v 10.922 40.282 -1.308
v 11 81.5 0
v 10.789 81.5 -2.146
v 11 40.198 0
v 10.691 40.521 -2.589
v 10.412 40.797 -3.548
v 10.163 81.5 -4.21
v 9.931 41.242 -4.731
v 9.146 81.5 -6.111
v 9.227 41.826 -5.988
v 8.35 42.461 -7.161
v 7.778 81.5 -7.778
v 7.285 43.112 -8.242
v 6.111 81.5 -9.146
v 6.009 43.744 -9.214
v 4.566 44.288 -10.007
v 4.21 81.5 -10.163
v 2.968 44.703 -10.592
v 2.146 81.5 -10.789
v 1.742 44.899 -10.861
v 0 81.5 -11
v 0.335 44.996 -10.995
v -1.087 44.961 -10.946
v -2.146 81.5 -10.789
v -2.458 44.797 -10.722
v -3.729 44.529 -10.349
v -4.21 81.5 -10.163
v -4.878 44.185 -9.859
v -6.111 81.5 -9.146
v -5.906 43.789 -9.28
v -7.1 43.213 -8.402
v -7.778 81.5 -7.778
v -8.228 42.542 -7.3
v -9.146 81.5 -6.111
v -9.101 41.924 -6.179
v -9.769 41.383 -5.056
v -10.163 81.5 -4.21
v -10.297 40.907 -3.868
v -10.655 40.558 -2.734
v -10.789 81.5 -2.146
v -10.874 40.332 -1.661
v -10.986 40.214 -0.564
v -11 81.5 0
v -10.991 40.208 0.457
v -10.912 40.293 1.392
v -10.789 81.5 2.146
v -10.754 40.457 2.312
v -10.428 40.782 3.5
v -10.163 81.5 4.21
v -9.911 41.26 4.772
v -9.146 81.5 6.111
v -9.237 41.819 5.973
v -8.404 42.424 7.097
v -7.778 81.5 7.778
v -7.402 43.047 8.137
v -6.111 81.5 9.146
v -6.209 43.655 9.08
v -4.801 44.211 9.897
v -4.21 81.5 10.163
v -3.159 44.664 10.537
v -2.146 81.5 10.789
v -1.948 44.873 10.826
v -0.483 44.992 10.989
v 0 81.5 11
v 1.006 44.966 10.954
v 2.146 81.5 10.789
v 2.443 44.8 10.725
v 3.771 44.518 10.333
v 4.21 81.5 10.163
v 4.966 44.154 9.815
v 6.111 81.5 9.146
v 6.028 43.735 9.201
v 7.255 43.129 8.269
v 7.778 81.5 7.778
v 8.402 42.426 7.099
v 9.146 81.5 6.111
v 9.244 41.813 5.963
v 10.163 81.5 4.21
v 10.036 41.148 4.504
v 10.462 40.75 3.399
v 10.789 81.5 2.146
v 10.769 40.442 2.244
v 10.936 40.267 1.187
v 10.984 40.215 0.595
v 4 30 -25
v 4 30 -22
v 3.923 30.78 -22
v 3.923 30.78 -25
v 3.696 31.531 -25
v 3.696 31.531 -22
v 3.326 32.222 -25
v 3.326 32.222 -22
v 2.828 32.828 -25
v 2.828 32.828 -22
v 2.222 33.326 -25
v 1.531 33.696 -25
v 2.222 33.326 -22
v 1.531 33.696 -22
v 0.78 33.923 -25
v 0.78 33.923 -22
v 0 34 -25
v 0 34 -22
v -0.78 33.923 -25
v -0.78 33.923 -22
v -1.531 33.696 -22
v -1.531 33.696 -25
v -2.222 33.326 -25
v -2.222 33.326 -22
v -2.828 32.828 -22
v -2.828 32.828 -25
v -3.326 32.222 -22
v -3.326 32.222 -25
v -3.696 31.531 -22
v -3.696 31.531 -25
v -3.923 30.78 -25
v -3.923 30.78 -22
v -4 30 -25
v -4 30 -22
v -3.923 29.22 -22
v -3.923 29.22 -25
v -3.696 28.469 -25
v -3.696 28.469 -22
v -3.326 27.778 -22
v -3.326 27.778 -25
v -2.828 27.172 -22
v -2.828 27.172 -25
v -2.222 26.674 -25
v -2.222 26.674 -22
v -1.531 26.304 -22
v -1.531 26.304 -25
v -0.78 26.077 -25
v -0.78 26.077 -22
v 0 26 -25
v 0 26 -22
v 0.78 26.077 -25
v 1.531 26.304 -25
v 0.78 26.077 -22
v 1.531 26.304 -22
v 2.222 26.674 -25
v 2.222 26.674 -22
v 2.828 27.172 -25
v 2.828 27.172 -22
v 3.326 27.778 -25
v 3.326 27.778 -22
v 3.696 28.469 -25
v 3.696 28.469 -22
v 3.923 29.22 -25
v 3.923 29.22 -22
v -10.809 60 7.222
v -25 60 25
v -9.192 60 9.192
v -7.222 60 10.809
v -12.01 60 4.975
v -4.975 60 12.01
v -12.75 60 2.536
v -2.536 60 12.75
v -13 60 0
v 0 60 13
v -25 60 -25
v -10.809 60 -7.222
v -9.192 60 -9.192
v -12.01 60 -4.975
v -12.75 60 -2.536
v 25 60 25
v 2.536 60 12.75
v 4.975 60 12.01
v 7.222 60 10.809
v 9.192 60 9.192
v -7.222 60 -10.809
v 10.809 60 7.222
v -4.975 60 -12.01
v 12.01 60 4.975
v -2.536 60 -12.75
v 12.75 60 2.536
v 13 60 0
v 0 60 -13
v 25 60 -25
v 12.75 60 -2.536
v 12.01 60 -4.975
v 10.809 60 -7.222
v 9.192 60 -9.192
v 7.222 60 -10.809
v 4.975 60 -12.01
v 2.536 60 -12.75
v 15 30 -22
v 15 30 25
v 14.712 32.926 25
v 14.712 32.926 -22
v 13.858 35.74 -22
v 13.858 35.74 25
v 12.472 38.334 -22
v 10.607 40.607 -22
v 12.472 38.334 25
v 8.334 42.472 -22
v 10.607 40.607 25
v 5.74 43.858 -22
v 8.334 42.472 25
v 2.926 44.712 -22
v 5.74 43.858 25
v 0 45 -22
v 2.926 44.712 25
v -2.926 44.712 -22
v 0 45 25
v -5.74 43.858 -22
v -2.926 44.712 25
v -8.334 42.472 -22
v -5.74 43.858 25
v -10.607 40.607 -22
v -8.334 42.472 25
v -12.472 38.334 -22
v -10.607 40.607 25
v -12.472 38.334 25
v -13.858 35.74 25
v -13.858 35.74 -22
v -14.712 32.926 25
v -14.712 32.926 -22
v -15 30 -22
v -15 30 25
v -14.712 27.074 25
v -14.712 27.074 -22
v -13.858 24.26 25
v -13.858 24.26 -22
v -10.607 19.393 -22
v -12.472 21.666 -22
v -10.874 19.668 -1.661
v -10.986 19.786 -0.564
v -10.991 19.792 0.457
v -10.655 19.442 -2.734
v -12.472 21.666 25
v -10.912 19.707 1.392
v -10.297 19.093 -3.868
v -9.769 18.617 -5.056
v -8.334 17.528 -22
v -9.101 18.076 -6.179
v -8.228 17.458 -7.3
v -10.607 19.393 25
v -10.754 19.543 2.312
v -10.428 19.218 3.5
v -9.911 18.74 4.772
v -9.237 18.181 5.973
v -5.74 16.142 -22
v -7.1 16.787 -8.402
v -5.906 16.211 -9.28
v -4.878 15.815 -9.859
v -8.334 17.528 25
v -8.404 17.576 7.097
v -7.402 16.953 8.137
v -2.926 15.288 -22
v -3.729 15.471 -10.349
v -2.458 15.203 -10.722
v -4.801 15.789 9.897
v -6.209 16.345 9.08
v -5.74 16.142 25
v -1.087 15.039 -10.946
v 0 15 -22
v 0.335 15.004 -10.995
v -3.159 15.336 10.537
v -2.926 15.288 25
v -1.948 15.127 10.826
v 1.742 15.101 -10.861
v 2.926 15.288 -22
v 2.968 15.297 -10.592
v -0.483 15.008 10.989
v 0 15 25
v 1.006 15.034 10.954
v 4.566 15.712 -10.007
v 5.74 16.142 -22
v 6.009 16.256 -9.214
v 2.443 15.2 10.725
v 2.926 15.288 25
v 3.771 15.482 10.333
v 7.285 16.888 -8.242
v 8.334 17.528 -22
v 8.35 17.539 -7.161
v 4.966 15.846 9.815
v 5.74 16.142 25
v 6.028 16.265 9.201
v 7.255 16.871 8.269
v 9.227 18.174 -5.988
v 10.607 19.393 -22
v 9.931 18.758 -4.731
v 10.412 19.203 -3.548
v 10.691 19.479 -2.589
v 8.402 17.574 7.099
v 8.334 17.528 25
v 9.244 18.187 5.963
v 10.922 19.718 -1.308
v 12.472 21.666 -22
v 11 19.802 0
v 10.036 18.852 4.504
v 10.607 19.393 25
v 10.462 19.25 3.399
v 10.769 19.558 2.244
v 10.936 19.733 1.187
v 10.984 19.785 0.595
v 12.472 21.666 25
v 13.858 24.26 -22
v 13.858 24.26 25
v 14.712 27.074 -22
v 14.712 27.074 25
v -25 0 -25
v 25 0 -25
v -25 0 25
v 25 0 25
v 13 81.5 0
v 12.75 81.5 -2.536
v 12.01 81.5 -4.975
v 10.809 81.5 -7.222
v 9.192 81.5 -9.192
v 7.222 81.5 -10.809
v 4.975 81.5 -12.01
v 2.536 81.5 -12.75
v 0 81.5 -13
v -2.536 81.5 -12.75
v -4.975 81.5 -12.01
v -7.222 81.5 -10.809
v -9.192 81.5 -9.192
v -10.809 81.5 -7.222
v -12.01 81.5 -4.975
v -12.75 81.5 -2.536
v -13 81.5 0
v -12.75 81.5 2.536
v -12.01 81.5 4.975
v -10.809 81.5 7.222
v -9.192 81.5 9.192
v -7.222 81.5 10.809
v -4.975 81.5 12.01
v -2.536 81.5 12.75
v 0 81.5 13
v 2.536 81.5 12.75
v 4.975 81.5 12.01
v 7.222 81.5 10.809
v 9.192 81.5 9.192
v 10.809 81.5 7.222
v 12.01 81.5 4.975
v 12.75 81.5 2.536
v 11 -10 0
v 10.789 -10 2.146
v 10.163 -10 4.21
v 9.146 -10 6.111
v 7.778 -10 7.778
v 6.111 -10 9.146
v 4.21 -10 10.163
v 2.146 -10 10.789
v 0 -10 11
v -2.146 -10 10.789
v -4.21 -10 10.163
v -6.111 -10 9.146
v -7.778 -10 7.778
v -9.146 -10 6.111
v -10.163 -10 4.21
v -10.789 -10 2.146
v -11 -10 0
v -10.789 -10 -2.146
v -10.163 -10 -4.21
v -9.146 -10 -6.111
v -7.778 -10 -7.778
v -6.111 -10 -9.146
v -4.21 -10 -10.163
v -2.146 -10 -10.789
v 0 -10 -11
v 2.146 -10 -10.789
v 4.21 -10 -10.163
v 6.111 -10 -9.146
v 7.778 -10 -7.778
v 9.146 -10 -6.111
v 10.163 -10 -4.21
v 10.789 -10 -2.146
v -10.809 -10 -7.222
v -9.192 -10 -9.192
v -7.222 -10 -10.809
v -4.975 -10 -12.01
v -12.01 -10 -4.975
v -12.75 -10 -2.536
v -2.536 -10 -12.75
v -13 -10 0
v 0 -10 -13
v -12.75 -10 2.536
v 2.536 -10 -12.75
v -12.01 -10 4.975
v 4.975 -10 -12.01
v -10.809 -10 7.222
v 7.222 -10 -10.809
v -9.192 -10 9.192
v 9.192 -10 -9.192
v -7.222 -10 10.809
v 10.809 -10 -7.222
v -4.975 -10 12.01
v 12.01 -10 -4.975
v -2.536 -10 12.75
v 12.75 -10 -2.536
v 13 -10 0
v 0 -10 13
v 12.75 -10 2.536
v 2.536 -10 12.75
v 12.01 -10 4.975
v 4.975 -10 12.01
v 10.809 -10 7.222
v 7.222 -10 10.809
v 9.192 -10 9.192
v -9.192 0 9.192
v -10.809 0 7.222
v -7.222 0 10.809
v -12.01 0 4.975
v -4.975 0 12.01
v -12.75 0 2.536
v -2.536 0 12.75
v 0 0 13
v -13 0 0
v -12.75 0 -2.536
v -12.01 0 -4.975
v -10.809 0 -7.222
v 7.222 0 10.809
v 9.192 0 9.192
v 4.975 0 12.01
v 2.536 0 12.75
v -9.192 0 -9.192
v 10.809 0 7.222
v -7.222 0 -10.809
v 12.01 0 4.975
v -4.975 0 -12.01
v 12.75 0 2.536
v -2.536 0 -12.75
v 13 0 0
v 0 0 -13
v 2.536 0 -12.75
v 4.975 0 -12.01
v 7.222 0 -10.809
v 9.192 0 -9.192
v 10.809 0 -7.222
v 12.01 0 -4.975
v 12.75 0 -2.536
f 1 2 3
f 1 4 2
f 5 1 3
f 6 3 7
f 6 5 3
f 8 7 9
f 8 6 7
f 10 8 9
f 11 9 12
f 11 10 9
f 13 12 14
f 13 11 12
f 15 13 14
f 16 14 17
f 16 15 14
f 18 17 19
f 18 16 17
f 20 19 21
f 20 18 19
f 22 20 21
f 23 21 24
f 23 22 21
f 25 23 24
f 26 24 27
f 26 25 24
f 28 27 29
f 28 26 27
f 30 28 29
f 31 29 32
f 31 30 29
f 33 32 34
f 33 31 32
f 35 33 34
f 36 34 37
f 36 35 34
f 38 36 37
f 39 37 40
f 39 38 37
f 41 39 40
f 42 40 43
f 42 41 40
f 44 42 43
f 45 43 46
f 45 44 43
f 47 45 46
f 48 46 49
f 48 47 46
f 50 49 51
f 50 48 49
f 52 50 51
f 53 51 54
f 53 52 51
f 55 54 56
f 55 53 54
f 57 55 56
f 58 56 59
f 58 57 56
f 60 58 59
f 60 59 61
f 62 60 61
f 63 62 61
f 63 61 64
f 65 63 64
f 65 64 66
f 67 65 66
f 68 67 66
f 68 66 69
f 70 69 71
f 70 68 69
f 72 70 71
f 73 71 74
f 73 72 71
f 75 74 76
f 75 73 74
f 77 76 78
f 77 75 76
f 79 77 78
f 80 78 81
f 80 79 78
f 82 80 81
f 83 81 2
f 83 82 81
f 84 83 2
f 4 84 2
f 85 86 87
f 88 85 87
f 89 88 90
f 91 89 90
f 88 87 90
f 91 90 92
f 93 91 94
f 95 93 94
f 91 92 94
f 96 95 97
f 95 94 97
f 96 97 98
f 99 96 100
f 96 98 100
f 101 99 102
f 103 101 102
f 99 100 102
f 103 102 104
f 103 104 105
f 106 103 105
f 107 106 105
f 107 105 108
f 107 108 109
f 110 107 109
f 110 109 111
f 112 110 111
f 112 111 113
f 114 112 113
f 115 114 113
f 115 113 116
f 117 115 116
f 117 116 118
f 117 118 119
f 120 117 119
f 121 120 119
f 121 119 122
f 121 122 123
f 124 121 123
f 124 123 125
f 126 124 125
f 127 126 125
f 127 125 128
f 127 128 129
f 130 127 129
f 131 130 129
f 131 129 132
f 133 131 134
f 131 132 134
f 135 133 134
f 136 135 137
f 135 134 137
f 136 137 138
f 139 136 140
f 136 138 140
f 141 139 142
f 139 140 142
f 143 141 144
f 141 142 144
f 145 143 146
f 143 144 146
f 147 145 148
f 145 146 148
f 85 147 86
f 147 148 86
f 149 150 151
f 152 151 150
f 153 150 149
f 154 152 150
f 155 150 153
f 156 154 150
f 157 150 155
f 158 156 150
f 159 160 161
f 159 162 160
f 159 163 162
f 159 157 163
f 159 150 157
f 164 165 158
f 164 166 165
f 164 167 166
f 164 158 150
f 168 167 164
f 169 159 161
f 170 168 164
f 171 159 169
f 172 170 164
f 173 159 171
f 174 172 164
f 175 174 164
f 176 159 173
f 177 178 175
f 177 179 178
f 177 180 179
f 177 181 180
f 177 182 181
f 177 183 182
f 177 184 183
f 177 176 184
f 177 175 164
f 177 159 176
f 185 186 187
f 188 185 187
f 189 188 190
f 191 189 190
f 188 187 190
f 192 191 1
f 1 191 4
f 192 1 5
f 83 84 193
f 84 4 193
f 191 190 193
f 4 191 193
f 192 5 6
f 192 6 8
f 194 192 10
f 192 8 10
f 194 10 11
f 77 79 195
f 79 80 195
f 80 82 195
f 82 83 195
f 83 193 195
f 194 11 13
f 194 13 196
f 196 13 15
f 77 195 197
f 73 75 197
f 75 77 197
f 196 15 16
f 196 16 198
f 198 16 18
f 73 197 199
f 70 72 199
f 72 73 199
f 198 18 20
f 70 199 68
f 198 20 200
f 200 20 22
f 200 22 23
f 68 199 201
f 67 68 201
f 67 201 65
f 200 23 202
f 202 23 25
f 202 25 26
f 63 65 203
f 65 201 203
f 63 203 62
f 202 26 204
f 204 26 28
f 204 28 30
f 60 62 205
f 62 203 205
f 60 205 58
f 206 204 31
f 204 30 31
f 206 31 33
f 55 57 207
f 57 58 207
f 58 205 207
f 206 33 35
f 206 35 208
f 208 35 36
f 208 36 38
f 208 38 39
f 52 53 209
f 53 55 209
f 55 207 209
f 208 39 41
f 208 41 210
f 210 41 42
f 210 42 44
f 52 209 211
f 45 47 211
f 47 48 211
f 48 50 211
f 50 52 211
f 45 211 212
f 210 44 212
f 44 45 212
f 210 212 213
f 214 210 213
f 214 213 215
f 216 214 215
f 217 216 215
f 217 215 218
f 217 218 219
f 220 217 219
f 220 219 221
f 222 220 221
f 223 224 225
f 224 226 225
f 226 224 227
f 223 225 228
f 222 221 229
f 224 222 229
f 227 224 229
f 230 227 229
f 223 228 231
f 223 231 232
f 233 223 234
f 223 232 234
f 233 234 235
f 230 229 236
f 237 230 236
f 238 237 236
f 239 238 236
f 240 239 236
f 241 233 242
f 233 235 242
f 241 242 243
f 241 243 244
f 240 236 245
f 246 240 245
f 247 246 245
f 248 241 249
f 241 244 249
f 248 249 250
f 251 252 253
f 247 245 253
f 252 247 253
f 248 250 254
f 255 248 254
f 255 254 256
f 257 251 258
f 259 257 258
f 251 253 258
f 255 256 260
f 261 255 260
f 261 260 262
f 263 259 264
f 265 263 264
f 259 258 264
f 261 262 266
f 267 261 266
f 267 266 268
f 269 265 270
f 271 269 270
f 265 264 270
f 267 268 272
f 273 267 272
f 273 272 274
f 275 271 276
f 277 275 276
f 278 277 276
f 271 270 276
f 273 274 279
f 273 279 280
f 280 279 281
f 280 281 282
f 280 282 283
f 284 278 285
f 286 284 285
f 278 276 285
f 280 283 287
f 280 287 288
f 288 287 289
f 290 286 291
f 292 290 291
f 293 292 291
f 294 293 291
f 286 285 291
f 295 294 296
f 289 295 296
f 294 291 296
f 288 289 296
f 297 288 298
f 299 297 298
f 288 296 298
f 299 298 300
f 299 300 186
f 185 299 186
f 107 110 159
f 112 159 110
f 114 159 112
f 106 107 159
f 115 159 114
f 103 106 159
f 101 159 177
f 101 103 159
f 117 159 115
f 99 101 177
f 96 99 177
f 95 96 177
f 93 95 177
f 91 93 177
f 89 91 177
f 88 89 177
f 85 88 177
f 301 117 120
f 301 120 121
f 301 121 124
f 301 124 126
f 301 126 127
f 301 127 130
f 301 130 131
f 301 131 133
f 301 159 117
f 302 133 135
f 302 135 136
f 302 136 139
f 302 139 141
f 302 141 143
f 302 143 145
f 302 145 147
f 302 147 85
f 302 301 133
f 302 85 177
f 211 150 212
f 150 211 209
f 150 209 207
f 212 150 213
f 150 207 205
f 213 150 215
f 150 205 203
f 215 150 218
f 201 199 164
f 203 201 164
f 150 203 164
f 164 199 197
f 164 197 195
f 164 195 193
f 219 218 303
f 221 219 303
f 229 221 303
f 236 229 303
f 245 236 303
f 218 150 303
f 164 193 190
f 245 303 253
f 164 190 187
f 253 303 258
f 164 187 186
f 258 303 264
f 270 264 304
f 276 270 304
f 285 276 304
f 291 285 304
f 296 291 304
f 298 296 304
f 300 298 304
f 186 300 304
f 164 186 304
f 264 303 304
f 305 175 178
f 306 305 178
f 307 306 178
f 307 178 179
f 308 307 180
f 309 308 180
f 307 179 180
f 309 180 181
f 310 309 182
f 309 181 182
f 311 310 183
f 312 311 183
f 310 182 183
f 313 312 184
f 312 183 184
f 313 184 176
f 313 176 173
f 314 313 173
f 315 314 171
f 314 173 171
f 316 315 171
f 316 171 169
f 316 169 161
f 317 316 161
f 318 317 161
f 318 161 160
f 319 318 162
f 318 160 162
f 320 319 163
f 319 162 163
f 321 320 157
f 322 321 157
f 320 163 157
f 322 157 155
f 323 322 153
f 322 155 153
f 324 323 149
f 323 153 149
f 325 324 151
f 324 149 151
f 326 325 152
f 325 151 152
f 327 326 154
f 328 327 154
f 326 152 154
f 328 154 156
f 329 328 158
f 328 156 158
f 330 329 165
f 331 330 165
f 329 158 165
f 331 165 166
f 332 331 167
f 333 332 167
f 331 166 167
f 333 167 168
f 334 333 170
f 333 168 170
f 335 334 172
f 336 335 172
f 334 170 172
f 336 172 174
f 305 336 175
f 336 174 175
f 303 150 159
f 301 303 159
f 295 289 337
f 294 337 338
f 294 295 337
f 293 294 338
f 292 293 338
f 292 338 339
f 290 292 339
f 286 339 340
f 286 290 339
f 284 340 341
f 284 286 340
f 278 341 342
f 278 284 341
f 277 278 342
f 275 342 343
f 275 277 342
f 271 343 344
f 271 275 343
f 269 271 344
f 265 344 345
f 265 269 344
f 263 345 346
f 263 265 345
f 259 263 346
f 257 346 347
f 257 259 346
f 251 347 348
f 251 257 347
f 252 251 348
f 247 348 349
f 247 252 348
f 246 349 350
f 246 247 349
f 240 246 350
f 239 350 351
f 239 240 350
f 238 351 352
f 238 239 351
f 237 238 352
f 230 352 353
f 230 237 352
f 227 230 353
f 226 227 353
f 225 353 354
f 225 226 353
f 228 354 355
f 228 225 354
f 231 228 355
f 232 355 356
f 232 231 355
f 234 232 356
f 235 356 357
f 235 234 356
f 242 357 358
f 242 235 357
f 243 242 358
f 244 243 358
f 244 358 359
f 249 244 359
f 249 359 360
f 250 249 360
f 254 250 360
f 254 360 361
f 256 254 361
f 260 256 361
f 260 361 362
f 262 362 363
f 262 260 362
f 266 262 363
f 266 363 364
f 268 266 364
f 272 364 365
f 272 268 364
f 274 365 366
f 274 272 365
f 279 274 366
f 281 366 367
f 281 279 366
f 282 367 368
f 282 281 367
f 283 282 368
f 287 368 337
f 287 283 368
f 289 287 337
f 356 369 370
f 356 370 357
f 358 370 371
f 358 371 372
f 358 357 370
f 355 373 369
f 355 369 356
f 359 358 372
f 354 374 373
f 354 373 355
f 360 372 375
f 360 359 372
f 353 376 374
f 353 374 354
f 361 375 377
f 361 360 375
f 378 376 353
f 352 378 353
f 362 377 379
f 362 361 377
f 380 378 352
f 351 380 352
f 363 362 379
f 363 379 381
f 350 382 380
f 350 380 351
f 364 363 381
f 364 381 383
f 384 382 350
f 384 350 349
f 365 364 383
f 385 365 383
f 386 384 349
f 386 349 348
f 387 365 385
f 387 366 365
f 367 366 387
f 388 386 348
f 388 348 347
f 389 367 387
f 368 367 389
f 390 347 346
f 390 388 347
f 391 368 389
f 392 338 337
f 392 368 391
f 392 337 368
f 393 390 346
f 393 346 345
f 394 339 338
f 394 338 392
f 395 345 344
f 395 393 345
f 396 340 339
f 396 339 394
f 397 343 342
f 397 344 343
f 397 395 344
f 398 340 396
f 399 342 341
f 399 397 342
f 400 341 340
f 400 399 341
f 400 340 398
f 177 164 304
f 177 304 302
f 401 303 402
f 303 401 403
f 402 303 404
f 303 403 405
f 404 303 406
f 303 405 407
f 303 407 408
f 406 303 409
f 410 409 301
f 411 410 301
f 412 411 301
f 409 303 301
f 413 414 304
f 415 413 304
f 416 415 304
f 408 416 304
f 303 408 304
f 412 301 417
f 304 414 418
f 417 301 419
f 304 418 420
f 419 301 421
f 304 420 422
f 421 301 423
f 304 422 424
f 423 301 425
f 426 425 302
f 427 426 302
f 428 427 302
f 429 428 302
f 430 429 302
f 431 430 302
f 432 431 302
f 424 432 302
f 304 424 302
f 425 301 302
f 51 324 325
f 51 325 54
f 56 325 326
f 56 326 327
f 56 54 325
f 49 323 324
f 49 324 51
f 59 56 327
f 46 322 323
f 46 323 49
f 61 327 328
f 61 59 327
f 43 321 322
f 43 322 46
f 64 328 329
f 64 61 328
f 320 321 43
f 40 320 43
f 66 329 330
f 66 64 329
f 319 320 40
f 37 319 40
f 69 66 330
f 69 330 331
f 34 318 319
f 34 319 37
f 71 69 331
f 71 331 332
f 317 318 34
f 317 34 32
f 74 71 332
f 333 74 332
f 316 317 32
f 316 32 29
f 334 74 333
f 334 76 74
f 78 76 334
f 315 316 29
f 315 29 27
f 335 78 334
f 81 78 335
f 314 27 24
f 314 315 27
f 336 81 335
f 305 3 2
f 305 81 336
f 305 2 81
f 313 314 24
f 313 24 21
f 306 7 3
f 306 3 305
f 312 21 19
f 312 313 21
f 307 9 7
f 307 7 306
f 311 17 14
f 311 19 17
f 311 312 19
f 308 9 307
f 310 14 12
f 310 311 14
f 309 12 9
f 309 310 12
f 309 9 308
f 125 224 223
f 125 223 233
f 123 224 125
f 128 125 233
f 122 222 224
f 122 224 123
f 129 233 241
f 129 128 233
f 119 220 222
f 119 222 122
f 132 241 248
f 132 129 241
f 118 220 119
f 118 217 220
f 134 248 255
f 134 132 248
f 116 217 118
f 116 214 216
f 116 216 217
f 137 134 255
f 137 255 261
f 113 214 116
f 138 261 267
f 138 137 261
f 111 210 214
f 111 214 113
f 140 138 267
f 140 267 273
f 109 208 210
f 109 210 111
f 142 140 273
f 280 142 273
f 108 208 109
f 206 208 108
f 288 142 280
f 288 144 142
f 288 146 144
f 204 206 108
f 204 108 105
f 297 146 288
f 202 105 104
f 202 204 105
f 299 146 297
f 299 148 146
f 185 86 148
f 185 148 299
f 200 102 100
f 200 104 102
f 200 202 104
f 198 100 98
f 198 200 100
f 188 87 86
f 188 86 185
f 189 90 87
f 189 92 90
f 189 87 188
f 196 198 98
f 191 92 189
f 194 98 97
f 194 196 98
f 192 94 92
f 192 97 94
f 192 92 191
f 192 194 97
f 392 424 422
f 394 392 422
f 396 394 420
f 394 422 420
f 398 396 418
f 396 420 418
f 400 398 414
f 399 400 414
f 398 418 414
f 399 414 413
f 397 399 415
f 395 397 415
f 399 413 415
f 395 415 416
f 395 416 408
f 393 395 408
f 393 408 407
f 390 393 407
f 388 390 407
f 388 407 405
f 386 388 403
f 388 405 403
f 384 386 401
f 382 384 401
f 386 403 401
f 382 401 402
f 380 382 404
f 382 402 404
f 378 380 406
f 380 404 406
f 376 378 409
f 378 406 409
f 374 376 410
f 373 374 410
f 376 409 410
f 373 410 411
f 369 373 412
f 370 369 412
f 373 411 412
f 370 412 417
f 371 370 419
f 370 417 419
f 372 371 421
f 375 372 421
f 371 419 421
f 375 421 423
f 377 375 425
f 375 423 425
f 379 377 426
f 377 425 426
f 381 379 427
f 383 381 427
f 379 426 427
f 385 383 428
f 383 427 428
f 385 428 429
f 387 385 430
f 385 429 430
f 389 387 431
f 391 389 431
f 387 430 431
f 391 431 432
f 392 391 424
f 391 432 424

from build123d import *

# Parameters (mm, degrees)
CROQUIS1_W              = 50
CROQUIS1_H              = 50
CROQUIS1_R              = 11
SALIENTE_EXTRUIR1_DEPTH = 60
CROQUIS3_R              = 15
CORTAR_EXTRUIR1_DEPTH   = 47
CROQUIS4_R              = 4
CORTAR_EXTRUIR2_DEPTH   = 10
CROQUIS5_R              = 13
CROQUIS5_R_2            = 11
SALIENTE_EXTRUIR3_DEPTH = 21.5
CROQUIS7_R              = 13
CROQUIS7_R_2            = 11
SALIENTE_EXTRUIR4_DEPTH = 10


with BuildPart() as part:
    # Croquis1 → Saliente-Extruir1 (new body)
    with BuildSketch(Plane(origin=(0, 0, 0), x_dir=(1, 0, 0), z_dir=(0, 1, 0))):
        Rectangle(CROQUIS1_W, CROQUIS1_H)
        Circle(CROQUIS1_R, mode=Mode.SUBTRACT)
    extrude(amount=SALIENTE_EXTRUIR1_DEPTH)

    # Croquis3 → Cortar-Extruir1 (cut)
    with BuildSketch(Plane.XY.offset(25)):
        with Locations((0, 30)):
            Circle(CROQUIS3_R)
    extrude(amount=-CORTAR_EXTRUIR1_DEPTH, mode=Mode.SUBTRACT)

    # Croquis4 → Cortar-Extruir2 (cut)
    with BuildSketch(Plane.XY.offset(-22)):
        with Locations((0, 30)):
            Circle(CROQUIS4_R)
    extrude(amount=-CORTAR_EXTRUIR2_DEPTH, mode=Mode.SUBTRACT)

    # Croquis5 → Saliente-Extruir3 (add)
    with BuildSketch(Plane(origin=(0, 60, 0), x_dir=(1, 0, 0), z_dir=(0, 1, 0))):
        Circle(CROQUIS5_R)
        Circle(CROQUIS5_R_2, mode=Mode.SUBTRACT)
    extrude(amount=SALIENTE_EXTRUIR3_DEPTH)

    # Croquis7 → Saliente-Extruir4 (add)
    with BuildSketch(Plane.XZ):
        Circle(CROQUIS7_R)
        Circle(CROQUIS7_R_2, mode=Mode.SUBTRACT)
    extrude(amount=SALIENTE_EXTRUIR4_DEPTH)


solid = part.part
